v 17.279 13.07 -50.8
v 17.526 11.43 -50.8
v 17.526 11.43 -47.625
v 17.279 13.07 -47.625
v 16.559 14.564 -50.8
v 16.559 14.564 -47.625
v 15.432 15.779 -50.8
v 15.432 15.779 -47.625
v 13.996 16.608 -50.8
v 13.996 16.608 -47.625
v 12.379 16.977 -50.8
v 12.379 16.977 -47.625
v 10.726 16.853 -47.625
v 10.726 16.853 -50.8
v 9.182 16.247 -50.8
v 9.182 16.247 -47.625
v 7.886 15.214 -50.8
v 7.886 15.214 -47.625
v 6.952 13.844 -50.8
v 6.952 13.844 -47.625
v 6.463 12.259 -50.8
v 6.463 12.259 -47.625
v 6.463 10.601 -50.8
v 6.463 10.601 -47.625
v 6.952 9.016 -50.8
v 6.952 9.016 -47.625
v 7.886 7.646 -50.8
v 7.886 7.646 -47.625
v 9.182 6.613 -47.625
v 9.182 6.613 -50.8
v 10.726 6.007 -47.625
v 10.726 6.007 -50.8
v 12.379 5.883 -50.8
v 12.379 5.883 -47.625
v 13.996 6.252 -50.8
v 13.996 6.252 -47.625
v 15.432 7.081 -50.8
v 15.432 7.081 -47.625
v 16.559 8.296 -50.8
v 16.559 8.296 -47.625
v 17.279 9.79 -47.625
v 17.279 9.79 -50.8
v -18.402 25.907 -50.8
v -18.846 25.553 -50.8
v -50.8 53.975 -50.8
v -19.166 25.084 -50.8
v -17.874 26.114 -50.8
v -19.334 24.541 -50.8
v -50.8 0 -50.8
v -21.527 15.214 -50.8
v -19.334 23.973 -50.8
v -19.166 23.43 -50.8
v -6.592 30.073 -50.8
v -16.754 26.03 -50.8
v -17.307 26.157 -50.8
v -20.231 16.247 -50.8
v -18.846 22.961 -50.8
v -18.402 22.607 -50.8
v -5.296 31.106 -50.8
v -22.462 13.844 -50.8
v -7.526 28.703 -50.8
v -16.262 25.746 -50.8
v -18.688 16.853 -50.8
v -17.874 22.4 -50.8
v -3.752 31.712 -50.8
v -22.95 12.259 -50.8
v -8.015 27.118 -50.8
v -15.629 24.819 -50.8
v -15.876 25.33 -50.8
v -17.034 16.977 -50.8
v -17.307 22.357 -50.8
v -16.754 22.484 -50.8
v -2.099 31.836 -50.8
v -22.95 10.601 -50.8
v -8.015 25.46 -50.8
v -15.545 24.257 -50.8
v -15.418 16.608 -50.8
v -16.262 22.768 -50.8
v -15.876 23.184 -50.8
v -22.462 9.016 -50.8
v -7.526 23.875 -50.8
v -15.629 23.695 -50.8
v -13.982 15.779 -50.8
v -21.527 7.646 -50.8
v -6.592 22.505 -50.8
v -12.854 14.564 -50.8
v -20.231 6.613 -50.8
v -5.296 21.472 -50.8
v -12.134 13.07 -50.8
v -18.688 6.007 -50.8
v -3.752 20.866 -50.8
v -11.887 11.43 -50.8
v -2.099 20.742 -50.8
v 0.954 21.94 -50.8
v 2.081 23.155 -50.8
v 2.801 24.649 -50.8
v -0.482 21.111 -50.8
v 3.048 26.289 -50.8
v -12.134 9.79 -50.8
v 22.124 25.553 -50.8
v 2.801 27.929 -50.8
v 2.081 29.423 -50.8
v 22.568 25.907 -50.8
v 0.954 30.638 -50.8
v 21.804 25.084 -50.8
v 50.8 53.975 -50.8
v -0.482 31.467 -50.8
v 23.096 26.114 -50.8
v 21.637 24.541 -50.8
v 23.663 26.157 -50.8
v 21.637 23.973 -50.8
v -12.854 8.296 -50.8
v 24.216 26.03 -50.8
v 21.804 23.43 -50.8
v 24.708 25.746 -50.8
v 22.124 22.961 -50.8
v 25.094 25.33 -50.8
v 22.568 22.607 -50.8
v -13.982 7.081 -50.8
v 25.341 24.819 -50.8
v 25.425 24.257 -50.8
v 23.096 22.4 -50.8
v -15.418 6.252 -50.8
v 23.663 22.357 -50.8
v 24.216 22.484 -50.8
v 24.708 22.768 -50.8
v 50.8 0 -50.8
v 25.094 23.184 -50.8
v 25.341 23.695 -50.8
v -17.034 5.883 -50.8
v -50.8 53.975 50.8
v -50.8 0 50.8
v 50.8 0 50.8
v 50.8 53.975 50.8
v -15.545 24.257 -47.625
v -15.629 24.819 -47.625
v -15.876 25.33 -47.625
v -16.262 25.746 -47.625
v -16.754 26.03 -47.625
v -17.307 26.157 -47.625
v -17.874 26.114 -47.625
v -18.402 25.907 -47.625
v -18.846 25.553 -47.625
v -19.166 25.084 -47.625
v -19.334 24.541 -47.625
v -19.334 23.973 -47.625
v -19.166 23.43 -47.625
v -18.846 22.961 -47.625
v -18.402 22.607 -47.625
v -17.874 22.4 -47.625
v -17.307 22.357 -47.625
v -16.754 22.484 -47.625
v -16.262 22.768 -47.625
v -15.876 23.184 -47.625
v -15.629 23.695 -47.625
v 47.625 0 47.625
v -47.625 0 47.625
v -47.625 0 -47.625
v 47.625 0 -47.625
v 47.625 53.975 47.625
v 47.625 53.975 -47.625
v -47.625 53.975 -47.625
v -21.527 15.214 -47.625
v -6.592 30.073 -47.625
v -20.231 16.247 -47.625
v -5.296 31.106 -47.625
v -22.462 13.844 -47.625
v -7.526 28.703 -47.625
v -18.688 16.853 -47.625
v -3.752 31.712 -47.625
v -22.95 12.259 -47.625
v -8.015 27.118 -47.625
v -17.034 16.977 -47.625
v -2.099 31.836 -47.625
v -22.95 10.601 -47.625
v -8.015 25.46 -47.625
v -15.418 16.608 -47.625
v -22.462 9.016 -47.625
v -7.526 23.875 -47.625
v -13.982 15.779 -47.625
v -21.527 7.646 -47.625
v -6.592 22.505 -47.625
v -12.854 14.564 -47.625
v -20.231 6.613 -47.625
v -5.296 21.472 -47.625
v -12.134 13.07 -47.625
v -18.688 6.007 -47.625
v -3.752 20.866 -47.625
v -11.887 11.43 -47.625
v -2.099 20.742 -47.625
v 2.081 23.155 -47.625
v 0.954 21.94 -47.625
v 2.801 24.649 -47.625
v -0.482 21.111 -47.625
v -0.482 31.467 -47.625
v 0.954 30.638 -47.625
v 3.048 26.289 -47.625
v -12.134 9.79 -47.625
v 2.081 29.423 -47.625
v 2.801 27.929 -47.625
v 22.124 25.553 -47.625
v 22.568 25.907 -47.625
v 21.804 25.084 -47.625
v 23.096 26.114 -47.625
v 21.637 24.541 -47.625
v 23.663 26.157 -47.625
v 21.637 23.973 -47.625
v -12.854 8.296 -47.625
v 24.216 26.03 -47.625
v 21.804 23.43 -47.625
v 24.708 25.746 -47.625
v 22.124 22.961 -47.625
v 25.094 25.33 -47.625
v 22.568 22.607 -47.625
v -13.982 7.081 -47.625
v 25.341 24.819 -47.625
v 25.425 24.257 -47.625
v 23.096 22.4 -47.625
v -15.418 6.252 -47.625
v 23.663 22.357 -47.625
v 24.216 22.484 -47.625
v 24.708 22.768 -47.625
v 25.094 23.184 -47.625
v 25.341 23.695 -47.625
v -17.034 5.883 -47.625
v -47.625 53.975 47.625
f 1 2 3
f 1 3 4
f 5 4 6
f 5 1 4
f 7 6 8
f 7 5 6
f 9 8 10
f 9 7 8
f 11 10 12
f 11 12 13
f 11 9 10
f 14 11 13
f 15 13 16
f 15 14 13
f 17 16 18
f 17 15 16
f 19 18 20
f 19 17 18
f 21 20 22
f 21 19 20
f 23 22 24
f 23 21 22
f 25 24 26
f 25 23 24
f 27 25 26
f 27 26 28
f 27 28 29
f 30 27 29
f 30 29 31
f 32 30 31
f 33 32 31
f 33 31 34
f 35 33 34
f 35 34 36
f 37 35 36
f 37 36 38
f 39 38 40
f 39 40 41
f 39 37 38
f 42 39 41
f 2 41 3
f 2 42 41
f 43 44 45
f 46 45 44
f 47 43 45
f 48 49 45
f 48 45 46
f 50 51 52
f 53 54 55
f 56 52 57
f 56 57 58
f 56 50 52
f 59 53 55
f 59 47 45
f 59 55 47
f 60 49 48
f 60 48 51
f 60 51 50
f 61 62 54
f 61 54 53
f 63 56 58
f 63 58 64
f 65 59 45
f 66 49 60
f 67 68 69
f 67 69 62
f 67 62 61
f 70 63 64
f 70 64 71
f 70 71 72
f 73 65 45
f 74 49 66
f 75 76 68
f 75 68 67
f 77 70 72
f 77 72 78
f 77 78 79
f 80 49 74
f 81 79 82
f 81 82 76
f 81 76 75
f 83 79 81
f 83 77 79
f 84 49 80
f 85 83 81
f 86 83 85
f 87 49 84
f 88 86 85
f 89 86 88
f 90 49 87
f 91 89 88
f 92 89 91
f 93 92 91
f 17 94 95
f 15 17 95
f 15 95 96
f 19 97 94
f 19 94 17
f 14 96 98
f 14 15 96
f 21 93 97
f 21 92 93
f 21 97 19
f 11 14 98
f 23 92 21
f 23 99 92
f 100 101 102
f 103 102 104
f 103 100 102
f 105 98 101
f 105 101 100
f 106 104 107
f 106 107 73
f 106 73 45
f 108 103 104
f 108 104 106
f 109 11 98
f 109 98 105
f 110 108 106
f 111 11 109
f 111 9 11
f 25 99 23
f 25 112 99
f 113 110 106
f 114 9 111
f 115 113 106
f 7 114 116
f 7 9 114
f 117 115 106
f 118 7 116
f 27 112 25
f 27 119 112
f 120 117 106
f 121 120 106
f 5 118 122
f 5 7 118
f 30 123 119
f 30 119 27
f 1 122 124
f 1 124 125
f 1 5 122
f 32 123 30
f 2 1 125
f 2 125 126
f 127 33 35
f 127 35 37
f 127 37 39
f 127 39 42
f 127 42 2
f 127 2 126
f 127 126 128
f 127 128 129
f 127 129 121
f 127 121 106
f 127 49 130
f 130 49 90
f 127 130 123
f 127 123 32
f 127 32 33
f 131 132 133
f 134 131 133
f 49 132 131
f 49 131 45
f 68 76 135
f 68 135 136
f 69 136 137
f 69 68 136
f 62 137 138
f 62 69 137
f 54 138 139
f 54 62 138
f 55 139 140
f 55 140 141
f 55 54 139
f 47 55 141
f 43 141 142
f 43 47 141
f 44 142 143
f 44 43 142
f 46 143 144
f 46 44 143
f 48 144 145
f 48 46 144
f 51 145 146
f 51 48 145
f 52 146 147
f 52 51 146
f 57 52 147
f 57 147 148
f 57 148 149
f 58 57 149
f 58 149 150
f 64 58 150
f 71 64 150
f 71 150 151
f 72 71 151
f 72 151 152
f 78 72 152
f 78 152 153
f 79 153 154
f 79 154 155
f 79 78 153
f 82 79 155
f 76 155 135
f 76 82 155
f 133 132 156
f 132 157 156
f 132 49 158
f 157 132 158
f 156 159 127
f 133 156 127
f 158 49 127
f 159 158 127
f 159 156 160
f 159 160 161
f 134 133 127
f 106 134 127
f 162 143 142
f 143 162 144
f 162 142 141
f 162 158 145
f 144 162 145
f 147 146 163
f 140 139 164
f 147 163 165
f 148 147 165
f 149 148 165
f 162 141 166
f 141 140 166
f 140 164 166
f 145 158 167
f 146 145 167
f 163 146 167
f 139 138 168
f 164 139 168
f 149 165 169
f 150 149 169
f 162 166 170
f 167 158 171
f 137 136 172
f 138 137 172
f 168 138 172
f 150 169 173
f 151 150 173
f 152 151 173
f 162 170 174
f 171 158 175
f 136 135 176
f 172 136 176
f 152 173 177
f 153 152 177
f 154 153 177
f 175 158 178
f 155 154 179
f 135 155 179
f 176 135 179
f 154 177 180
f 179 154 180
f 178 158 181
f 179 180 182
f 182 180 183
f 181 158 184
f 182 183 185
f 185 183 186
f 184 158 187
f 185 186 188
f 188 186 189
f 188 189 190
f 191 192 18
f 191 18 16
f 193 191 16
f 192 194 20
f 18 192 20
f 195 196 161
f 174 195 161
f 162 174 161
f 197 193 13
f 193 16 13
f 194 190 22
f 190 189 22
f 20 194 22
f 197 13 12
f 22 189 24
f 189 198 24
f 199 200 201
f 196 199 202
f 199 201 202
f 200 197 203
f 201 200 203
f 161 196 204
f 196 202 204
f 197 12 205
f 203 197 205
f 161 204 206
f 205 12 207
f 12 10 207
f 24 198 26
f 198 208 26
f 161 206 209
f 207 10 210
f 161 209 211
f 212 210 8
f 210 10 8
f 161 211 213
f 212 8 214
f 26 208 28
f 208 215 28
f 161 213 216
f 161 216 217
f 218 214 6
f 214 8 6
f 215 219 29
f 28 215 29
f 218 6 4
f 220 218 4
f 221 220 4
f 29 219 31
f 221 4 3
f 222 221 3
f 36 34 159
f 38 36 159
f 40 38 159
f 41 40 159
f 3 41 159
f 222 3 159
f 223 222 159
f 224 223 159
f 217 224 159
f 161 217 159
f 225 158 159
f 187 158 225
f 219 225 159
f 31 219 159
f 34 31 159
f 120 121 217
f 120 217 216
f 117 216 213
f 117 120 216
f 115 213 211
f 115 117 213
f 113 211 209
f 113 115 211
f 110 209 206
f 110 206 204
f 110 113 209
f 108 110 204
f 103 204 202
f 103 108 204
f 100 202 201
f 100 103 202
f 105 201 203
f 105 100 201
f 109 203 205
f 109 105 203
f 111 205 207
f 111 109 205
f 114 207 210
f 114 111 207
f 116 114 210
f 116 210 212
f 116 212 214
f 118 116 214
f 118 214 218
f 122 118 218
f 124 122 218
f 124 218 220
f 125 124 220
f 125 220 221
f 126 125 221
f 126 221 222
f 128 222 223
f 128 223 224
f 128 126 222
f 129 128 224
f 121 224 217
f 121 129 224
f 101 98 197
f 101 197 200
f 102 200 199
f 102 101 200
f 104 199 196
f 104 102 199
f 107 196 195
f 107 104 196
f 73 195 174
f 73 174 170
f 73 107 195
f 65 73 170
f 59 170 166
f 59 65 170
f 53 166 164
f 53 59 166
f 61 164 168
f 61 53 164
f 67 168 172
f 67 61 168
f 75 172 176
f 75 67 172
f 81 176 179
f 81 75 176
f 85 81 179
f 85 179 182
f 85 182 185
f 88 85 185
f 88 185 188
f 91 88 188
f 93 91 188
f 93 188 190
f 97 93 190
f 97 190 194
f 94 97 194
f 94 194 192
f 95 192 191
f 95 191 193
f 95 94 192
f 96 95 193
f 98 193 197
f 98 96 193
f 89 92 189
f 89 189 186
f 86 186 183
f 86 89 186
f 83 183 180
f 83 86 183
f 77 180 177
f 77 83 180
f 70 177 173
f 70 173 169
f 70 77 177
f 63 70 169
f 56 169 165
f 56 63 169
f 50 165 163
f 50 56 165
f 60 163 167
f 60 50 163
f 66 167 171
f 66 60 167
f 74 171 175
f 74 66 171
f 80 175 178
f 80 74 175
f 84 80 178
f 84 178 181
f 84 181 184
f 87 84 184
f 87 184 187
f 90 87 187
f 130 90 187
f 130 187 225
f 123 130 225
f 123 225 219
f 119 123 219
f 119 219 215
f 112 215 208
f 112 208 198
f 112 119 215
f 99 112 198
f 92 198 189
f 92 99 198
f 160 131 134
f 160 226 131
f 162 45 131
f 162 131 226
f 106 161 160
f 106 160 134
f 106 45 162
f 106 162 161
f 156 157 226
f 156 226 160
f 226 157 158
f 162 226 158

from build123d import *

# Parameters (mm, degrees)
SKETCH1_W                = 101.6
SKETCH1_H                = 101.6
SKETCH1_W_2              = 95.25
SKETCH1_H_2              = 95.25
BOSS_EXTRUDE1_DEPTH      = 53.975
CUT_EXTRUDE2_START       = -50.8
CUT_EXTRUDE2_OUTLINE_R   = 5.5626
CUT_EXTRUDE2_OUTLINE_R_2 = 1.905
CUT_EXTRUDE2_DEPTH       = 3.175


# Read off the part's stored shape, not the designer's step: Cut-Extrude2
with BuildPart() as part:
    # Sketch1 → Boss-Extrude1 (new body)
    with BuildSketch(Plane(origin=(0, 0, 0), x_dir=(1, 0, 0), z_dir=(0, 1, 0))):
        Rectangle(SKETCH1_W, SKETCH1_H)
        Rectangle(SKETCH1_W_2, SKETCH1_H_2, mode=Mode.SUBTRACT)
    extrude(amount=BOSS_EXTRUDE1_DEPTH)

    # Cut-Extrude2 outline → Cut-Extrude2 (cut)
    with BuildSketch(Plane.XY.offset(CUT_EXTRUDE2_START)):
        with Locations((-2.5146, 26.289)):
            Circle(CUT_EXTRUDE2_OUTLINE_R)
        with Locations((23.5204, 24.257)):
            Circle(CUT_EXTRUDE2_OUTLINE_R_2)
        with Locations((11.9634, 11.43)):
            Circle(CUT_EXTRUDE2_OUTLINE_R)
        with Locations((-17.4498, 11.43)):
            Circle(CUT_EXTRUDE2_OUTLINE_R)
        with Locations((-17.4498, 24.257)):
            Circle(CUT_EXTRUDE2_OUTLINE_R_2)
    extrude(amount=CUT_EXTRUDE2_DEPTH, mode=Mode.SUBTRACT)


solid = part.part
